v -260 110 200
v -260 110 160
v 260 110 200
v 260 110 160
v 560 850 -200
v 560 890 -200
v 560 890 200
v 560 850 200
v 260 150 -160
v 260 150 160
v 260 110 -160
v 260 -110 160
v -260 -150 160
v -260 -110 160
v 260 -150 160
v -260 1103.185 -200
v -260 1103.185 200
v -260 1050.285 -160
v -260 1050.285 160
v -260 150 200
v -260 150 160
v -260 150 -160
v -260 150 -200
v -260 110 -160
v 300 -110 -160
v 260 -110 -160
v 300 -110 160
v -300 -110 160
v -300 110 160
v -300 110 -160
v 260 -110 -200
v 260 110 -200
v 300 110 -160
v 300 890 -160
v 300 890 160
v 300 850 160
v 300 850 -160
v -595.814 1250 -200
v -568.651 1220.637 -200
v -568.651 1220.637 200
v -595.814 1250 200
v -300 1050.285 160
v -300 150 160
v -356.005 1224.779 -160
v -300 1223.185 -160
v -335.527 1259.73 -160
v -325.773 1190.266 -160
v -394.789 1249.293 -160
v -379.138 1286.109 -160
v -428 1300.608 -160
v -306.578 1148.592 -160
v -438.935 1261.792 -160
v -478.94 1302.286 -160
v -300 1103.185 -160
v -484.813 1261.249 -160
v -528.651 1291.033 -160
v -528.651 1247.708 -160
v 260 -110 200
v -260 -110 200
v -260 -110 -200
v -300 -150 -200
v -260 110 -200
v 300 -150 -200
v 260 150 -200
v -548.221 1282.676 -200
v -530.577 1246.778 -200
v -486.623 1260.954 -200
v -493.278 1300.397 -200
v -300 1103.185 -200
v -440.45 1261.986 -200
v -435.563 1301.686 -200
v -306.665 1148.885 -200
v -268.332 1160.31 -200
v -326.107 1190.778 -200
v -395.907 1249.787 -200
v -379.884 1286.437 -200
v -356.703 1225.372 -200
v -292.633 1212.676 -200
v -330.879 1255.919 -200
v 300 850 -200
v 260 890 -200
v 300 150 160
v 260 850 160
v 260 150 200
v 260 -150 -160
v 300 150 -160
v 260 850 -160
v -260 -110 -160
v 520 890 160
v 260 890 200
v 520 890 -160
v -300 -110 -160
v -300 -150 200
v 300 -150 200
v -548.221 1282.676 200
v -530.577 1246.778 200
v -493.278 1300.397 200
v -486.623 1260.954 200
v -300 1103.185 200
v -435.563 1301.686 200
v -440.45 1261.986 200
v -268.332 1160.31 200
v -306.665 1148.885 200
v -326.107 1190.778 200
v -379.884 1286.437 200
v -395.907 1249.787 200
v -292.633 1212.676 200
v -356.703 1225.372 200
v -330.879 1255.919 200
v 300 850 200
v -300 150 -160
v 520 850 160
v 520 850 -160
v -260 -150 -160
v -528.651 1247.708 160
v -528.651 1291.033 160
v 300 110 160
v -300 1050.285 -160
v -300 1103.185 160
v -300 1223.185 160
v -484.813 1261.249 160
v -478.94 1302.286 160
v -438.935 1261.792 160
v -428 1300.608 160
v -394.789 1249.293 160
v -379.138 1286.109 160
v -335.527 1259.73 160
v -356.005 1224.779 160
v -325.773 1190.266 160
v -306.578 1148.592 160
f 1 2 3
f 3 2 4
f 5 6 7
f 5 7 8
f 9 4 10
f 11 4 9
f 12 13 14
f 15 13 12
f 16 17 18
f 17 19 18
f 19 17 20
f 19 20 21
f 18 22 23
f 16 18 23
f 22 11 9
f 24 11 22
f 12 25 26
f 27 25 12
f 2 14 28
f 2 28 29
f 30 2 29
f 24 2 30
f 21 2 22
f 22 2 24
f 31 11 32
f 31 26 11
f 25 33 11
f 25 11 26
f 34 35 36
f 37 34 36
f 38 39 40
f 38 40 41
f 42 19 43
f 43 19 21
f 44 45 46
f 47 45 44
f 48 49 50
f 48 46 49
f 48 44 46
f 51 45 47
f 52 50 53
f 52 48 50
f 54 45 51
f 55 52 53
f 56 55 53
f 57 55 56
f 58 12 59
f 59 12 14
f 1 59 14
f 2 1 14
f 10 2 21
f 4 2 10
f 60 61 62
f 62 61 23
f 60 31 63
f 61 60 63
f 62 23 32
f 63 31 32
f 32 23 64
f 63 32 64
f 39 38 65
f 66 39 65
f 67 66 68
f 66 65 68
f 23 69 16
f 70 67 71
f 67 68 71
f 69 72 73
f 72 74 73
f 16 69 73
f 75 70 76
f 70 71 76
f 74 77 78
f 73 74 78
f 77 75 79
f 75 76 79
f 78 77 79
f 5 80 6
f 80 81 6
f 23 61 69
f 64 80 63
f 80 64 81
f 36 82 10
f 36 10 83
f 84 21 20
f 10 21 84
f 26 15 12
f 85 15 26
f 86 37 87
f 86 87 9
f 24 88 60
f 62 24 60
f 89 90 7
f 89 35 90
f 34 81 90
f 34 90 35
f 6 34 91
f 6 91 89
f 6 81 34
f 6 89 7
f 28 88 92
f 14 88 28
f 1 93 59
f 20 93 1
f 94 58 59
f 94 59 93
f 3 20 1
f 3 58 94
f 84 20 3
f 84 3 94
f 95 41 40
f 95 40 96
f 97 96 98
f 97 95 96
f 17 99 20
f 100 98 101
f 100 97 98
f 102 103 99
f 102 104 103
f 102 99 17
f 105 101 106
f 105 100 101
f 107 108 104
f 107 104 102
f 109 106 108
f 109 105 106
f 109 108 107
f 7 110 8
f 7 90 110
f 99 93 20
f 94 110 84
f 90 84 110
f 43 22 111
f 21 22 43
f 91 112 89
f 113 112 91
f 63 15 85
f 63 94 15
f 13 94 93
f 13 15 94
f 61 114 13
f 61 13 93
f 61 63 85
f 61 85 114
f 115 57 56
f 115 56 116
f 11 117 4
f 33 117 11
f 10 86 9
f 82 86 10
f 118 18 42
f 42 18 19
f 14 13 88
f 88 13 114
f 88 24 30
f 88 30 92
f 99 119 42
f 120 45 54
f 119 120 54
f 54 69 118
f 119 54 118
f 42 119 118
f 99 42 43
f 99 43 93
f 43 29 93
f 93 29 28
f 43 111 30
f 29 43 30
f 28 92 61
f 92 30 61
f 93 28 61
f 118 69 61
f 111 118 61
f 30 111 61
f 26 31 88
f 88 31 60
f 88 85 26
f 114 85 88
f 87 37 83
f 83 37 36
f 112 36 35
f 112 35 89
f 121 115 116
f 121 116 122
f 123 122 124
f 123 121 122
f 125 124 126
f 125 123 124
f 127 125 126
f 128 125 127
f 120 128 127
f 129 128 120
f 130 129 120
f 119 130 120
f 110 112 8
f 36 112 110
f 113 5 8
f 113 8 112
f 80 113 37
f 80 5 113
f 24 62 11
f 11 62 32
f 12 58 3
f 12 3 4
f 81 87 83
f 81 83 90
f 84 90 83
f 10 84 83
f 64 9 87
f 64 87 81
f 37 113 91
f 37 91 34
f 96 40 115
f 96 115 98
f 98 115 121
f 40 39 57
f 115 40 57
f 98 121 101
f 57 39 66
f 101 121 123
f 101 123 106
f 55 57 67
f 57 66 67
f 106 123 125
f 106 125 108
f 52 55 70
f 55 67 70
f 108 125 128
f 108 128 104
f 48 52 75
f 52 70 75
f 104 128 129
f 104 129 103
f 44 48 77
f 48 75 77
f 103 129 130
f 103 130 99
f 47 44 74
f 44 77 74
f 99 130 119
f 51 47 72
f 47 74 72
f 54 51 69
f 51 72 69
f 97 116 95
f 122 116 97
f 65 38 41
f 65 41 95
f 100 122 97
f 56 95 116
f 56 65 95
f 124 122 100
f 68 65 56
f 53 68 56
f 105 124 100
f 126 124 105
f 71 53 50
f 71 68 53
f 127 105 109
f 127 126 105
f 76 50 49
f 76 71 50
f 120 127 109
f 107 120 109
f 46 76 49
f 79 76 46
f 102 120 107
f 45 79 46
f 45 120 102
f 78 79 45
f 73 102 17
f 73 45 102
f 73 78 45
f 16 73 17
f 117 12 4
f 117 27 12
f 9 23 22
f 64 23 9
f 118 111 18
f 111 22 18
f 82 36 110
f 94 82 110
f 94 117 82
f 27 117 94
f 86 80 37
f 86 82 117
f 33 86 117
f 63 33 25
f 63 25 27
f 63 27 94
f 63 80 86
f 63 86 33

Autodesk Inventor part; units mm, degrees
ref_plane "YZ Plane" through (0, 0, 0) normal (1, 0, 0) x (0, 1, 0)
ref_plane "XZ Plane" through (0, 0, 0) normal (0, 1, 0) x (-1, 0, 0)
ref_plane "XY Plane" through (0, 0, 0) normal (0, 0, 1) x (1, 0, 0)
sketch "Sketch1" plane through (0, 0, 0) normal (0, 0, 1) x (1, 0, 0)
  line L0 (-300, 150) -> (300, 150)
  line L1 (300, 150) -> (300, -150)
  line L2 (300, -150) -> (-300, -150)
  line L3 (-300, -150) -> (-300, 150)
  line L4 (-300, 150) -> (-260, 150)
  line L5 (-260, 150) -> (-260, 1103.1848)
  line L6 (-300, 1103.1848) -> (-300, 150)
  line L7 (300, 150) -> (260, 150)
  line L8 (260, 150) -> (260, 890)
  line L9 (260, 890) -> (300, 890)
  line L10 (300, 890) -> (300, 150)
  line L11 (300, 890) -> (560, 890)
  line L12 (560, 890) -> (560, 850)
  line L13 (560, 850) -> (300, 850)
  line L14 (300, 850) -> (300, 890)
  line L15 (-260, 110) -> (260, 110)
  line L16 (260, 110) -> (260, -110)
  line L17 (260, -110) -> (-260, -110)
  line L18 (-260, -110) -> (-260, 110)
  arc A0 (-260, 1103.1848) -> (-595.8135, 1250) centre (-460, 1103.1848) ccw
  arc A1 (-300, 1103.1848) -> (-568.6508, 1220.637) centre (-460, 1103.1848) ccw
  line L19 (-568.6508, 1220.637) -> (-595.8135, 1250)
  line L20 (-300, 1103.1848) -> (-260, 1103.1848)
  point P0 (0, 0)
  point P1 (0, 110)
  point P2 (-260, 0)
  dimension "d0" = 40
  dimension "d1" = 40
  dimension "d2" = 40
  dimension "d3" = 40
  dimension "d4" = 40
  dimension "d6" = 600
  dimension "d7" = 1400
  dimension "d8" = 1000
  dimension "d9" = 300
  dimension "d29" = 200
  dimension "d30" = 300
extrude "Extrusion1" add sketch "Sketch1" along normal mid plane 400
sketch "Sketch2" plane through (-300, -150, 200) normal (0, -1, 0) x (1, 0, 0)
  line L0 (40, 0) -> (40, -400) projected
  line L1 (560, 0) -> (560, -400) projected
  line L2 (600, -400) -> (600, 0) projected
  line L3 (0, 0) -> (600, 0) projected
  line L4 (600, -400) -> (0, -400) projected
  line L5 (0, -400) -> (0, 0) projected
  line L6 (-268.6508, 0) -> (0, 0) projected
  line L7 (0, -400) -> (-268.6508, -400) projected
  line L8 (-268.6508, -400) -> (-268.6508, 0) projected
  line L9 (600, 0) -> (860, 0) projected
  line L10 (860, -400) -> (860, 0) projected
  line L11 (860, -400) -> (600, -400) projected
  line L12 (0, -400) -> (0, 0) projected
  line L13 (-228.6508, -40) -> (0, -40)
  line L14 (0, -40) -> (0, -360)
  line L15 (0, -360) -> (-228.6508, -360)
  line L16 (-228.6508, -360) -> (-228.6508, -40)
  line L17 (560, -400) -> (560, 0) projected
  line L18 (40, -40) -> (560, -40)
  line L19 (560, -40) -> (560, -360)
  line L20 (560, -360) -> (40, -360)
  line L21 (40, -360) -> (40, -40)
  line L22 (600, -40) -> (820, -40)
  line L23 (820, -40) -> (820, -360)
  line L24 (820, -360) -> (600, -360)
  line L25 (600, -360) -> (600, -40)
  point P0 (300, -200)
  point P1 (-228.6508, -200)
  dimension "d14" = 40
  dimension "d15" = 40
  dimension "d16" = 40
  dimension "d17" = 40
  dimension "d18" = 40
  dimension "d19" = 40
extrude "Extrusion2" cut sketch "Sketch2" against normal through all contours L18 L1 L20 L0 | L5 L15 L16 L13 | L22 L23 L24 L2
sketch "Sketch3" plane through (300, -150, -200) normal (1, 0, 0) x (0, 0, -1)
  line L0 (0, 1000) -> (-400, 1000) projected
  line L1 (-400, 0) -> (-400, 1000) projected
  line L2 (0, 1000) -> (0, 0) projected
  line L3 (0, 0) -> (-400, 0) projected
  line L4 (-360, 260) -> (-400, 260) projected
  line L5 (0, 260) -> (-40, 260) projected
  line L6 (-400, 40) -> (-360, 40) projected
  line L7 (-40, 40) -> (0, 40) projected
  line L8 (0, 1040) -> (-400, 1040) projected
  line L9 (-40, 1373.1848) -> (-360, 1373.1848) projected
  line L10 (-40, 1397.7084) -> (-360, 1397.7084) projected
  line L11 (-360, 260) -> (-40, 260)
  line L12 (-40, 260) -> (-40, 40)
  line L13 (-40, 40) -> (-360, 40)
  line L14 (-360, 40) -> (-360, 260)
  line L15 (-360, 300) -> (-400, 300) projected
  line L16 (-360, 1000) -> (-40, 1000)
  line L17 (-40, 1000) -> (-40, 300)
  line L18 (-40, 300) -> (-360, 300)
  line L19 (-360, 300) -> (-360, 1000)
  line L20 (0, 1040) -> (-400, 1040) projected
  line L21 (-40, 1373.1848) -> (-40, 1453.1848) projected
  line L22 (-360, 1040) -> (-40, 1040)
  line L23 (-40, 1040) -> (-40, 1200.2849)
  line L24 (-40, 1200.2849) -> (-360, 1200.2849)
  line L25 (-360, 1200.2849) -> (-360, 1040)
  point P0 (-200, 150)
  point P1 (-200, 260)
  point P2 (-360, 150)
  point P3 (-380, 260)
  point P4 (-200, 300)
  point P5 (-40, 1441.0334)
  dimension "d22" = 40
  dimension "d23" = 40
  dimension "d24" = 160.2849
extrude "Extrusion3" cut sketch "Sketch3" against normal through all contours L17 L18 L19 L0 | L12 L13 L14 L11 | L8 L25 L24 L23
sketch "Sketch4" plane through (-260, 150, -200) normal (1, 0, 0) x (0, 0, -1)
  line L0 (-360, 740) -> (-40, 740) projected
  line L1 (0, 953.1848) -> (-40, 953.1848) projected
  line L2 (0, -300) -> (0, 953.1848) projected
  line L3 (0, -300) -> (-400, -300) projected
  line L4 (-400, 953.1848) -> (-400, -300) projected
  line L5 (-360, -40) -> (-360, -260) projected
  line L6 (-360, -260) -> (-40, -260) projected
  line L7 (-40, -260) -> (-40, -40) projected
  line L8 (-40, -40) -> (-360, -40) projected
  line L9 (-360, 700) -> (-360, 0) projected
  line L10 (-360, 0) -> (-40, 0) projected
  line L11 (-40, 0) -> (-40, 700) projected
  line L12 (-40, 700) -> (-360, 700) projected
  line L13 (-360, 0) -> (-360, 700) projected
  line L14 (-400, 953.1848) -> (0, 953.1848) projected
  line L15 (-360, 700) -> (-40, 700)
  line L16 (-40, 700) -> (-40, 876.7461)
  line L17 (-40, 876.7461) -> (-360, 876.7461)
  line L18 (-360, 876.7461) -> (-360, 700)
  line L19 (-40, 740) -> (-40, 900.2849) projected
  line L20 (-40, 900.2849) -> (-360, 900.2849) projected
  line L21 (-360, 900.2849) -> (-360, 740) projected
  line L22 (-360, 953.1848) -> (-360, 1073.1848) projected
  line L23 (-40, 1073.1848) -> (-360, 1073.1848) projected
  line L24 (-40, 953.1848) -> (-40, 1073.1848) projected
  line L25 (-360, 953.1848) -> (-400, 953.1848) projected
  point P0 (-200, -150)
extrude "Extrusion4" cut sketch "Sketch4" against normal up to next contours L18 L17 L16 L0 | L0 L16 L12 L18
properties part number "Frame"
